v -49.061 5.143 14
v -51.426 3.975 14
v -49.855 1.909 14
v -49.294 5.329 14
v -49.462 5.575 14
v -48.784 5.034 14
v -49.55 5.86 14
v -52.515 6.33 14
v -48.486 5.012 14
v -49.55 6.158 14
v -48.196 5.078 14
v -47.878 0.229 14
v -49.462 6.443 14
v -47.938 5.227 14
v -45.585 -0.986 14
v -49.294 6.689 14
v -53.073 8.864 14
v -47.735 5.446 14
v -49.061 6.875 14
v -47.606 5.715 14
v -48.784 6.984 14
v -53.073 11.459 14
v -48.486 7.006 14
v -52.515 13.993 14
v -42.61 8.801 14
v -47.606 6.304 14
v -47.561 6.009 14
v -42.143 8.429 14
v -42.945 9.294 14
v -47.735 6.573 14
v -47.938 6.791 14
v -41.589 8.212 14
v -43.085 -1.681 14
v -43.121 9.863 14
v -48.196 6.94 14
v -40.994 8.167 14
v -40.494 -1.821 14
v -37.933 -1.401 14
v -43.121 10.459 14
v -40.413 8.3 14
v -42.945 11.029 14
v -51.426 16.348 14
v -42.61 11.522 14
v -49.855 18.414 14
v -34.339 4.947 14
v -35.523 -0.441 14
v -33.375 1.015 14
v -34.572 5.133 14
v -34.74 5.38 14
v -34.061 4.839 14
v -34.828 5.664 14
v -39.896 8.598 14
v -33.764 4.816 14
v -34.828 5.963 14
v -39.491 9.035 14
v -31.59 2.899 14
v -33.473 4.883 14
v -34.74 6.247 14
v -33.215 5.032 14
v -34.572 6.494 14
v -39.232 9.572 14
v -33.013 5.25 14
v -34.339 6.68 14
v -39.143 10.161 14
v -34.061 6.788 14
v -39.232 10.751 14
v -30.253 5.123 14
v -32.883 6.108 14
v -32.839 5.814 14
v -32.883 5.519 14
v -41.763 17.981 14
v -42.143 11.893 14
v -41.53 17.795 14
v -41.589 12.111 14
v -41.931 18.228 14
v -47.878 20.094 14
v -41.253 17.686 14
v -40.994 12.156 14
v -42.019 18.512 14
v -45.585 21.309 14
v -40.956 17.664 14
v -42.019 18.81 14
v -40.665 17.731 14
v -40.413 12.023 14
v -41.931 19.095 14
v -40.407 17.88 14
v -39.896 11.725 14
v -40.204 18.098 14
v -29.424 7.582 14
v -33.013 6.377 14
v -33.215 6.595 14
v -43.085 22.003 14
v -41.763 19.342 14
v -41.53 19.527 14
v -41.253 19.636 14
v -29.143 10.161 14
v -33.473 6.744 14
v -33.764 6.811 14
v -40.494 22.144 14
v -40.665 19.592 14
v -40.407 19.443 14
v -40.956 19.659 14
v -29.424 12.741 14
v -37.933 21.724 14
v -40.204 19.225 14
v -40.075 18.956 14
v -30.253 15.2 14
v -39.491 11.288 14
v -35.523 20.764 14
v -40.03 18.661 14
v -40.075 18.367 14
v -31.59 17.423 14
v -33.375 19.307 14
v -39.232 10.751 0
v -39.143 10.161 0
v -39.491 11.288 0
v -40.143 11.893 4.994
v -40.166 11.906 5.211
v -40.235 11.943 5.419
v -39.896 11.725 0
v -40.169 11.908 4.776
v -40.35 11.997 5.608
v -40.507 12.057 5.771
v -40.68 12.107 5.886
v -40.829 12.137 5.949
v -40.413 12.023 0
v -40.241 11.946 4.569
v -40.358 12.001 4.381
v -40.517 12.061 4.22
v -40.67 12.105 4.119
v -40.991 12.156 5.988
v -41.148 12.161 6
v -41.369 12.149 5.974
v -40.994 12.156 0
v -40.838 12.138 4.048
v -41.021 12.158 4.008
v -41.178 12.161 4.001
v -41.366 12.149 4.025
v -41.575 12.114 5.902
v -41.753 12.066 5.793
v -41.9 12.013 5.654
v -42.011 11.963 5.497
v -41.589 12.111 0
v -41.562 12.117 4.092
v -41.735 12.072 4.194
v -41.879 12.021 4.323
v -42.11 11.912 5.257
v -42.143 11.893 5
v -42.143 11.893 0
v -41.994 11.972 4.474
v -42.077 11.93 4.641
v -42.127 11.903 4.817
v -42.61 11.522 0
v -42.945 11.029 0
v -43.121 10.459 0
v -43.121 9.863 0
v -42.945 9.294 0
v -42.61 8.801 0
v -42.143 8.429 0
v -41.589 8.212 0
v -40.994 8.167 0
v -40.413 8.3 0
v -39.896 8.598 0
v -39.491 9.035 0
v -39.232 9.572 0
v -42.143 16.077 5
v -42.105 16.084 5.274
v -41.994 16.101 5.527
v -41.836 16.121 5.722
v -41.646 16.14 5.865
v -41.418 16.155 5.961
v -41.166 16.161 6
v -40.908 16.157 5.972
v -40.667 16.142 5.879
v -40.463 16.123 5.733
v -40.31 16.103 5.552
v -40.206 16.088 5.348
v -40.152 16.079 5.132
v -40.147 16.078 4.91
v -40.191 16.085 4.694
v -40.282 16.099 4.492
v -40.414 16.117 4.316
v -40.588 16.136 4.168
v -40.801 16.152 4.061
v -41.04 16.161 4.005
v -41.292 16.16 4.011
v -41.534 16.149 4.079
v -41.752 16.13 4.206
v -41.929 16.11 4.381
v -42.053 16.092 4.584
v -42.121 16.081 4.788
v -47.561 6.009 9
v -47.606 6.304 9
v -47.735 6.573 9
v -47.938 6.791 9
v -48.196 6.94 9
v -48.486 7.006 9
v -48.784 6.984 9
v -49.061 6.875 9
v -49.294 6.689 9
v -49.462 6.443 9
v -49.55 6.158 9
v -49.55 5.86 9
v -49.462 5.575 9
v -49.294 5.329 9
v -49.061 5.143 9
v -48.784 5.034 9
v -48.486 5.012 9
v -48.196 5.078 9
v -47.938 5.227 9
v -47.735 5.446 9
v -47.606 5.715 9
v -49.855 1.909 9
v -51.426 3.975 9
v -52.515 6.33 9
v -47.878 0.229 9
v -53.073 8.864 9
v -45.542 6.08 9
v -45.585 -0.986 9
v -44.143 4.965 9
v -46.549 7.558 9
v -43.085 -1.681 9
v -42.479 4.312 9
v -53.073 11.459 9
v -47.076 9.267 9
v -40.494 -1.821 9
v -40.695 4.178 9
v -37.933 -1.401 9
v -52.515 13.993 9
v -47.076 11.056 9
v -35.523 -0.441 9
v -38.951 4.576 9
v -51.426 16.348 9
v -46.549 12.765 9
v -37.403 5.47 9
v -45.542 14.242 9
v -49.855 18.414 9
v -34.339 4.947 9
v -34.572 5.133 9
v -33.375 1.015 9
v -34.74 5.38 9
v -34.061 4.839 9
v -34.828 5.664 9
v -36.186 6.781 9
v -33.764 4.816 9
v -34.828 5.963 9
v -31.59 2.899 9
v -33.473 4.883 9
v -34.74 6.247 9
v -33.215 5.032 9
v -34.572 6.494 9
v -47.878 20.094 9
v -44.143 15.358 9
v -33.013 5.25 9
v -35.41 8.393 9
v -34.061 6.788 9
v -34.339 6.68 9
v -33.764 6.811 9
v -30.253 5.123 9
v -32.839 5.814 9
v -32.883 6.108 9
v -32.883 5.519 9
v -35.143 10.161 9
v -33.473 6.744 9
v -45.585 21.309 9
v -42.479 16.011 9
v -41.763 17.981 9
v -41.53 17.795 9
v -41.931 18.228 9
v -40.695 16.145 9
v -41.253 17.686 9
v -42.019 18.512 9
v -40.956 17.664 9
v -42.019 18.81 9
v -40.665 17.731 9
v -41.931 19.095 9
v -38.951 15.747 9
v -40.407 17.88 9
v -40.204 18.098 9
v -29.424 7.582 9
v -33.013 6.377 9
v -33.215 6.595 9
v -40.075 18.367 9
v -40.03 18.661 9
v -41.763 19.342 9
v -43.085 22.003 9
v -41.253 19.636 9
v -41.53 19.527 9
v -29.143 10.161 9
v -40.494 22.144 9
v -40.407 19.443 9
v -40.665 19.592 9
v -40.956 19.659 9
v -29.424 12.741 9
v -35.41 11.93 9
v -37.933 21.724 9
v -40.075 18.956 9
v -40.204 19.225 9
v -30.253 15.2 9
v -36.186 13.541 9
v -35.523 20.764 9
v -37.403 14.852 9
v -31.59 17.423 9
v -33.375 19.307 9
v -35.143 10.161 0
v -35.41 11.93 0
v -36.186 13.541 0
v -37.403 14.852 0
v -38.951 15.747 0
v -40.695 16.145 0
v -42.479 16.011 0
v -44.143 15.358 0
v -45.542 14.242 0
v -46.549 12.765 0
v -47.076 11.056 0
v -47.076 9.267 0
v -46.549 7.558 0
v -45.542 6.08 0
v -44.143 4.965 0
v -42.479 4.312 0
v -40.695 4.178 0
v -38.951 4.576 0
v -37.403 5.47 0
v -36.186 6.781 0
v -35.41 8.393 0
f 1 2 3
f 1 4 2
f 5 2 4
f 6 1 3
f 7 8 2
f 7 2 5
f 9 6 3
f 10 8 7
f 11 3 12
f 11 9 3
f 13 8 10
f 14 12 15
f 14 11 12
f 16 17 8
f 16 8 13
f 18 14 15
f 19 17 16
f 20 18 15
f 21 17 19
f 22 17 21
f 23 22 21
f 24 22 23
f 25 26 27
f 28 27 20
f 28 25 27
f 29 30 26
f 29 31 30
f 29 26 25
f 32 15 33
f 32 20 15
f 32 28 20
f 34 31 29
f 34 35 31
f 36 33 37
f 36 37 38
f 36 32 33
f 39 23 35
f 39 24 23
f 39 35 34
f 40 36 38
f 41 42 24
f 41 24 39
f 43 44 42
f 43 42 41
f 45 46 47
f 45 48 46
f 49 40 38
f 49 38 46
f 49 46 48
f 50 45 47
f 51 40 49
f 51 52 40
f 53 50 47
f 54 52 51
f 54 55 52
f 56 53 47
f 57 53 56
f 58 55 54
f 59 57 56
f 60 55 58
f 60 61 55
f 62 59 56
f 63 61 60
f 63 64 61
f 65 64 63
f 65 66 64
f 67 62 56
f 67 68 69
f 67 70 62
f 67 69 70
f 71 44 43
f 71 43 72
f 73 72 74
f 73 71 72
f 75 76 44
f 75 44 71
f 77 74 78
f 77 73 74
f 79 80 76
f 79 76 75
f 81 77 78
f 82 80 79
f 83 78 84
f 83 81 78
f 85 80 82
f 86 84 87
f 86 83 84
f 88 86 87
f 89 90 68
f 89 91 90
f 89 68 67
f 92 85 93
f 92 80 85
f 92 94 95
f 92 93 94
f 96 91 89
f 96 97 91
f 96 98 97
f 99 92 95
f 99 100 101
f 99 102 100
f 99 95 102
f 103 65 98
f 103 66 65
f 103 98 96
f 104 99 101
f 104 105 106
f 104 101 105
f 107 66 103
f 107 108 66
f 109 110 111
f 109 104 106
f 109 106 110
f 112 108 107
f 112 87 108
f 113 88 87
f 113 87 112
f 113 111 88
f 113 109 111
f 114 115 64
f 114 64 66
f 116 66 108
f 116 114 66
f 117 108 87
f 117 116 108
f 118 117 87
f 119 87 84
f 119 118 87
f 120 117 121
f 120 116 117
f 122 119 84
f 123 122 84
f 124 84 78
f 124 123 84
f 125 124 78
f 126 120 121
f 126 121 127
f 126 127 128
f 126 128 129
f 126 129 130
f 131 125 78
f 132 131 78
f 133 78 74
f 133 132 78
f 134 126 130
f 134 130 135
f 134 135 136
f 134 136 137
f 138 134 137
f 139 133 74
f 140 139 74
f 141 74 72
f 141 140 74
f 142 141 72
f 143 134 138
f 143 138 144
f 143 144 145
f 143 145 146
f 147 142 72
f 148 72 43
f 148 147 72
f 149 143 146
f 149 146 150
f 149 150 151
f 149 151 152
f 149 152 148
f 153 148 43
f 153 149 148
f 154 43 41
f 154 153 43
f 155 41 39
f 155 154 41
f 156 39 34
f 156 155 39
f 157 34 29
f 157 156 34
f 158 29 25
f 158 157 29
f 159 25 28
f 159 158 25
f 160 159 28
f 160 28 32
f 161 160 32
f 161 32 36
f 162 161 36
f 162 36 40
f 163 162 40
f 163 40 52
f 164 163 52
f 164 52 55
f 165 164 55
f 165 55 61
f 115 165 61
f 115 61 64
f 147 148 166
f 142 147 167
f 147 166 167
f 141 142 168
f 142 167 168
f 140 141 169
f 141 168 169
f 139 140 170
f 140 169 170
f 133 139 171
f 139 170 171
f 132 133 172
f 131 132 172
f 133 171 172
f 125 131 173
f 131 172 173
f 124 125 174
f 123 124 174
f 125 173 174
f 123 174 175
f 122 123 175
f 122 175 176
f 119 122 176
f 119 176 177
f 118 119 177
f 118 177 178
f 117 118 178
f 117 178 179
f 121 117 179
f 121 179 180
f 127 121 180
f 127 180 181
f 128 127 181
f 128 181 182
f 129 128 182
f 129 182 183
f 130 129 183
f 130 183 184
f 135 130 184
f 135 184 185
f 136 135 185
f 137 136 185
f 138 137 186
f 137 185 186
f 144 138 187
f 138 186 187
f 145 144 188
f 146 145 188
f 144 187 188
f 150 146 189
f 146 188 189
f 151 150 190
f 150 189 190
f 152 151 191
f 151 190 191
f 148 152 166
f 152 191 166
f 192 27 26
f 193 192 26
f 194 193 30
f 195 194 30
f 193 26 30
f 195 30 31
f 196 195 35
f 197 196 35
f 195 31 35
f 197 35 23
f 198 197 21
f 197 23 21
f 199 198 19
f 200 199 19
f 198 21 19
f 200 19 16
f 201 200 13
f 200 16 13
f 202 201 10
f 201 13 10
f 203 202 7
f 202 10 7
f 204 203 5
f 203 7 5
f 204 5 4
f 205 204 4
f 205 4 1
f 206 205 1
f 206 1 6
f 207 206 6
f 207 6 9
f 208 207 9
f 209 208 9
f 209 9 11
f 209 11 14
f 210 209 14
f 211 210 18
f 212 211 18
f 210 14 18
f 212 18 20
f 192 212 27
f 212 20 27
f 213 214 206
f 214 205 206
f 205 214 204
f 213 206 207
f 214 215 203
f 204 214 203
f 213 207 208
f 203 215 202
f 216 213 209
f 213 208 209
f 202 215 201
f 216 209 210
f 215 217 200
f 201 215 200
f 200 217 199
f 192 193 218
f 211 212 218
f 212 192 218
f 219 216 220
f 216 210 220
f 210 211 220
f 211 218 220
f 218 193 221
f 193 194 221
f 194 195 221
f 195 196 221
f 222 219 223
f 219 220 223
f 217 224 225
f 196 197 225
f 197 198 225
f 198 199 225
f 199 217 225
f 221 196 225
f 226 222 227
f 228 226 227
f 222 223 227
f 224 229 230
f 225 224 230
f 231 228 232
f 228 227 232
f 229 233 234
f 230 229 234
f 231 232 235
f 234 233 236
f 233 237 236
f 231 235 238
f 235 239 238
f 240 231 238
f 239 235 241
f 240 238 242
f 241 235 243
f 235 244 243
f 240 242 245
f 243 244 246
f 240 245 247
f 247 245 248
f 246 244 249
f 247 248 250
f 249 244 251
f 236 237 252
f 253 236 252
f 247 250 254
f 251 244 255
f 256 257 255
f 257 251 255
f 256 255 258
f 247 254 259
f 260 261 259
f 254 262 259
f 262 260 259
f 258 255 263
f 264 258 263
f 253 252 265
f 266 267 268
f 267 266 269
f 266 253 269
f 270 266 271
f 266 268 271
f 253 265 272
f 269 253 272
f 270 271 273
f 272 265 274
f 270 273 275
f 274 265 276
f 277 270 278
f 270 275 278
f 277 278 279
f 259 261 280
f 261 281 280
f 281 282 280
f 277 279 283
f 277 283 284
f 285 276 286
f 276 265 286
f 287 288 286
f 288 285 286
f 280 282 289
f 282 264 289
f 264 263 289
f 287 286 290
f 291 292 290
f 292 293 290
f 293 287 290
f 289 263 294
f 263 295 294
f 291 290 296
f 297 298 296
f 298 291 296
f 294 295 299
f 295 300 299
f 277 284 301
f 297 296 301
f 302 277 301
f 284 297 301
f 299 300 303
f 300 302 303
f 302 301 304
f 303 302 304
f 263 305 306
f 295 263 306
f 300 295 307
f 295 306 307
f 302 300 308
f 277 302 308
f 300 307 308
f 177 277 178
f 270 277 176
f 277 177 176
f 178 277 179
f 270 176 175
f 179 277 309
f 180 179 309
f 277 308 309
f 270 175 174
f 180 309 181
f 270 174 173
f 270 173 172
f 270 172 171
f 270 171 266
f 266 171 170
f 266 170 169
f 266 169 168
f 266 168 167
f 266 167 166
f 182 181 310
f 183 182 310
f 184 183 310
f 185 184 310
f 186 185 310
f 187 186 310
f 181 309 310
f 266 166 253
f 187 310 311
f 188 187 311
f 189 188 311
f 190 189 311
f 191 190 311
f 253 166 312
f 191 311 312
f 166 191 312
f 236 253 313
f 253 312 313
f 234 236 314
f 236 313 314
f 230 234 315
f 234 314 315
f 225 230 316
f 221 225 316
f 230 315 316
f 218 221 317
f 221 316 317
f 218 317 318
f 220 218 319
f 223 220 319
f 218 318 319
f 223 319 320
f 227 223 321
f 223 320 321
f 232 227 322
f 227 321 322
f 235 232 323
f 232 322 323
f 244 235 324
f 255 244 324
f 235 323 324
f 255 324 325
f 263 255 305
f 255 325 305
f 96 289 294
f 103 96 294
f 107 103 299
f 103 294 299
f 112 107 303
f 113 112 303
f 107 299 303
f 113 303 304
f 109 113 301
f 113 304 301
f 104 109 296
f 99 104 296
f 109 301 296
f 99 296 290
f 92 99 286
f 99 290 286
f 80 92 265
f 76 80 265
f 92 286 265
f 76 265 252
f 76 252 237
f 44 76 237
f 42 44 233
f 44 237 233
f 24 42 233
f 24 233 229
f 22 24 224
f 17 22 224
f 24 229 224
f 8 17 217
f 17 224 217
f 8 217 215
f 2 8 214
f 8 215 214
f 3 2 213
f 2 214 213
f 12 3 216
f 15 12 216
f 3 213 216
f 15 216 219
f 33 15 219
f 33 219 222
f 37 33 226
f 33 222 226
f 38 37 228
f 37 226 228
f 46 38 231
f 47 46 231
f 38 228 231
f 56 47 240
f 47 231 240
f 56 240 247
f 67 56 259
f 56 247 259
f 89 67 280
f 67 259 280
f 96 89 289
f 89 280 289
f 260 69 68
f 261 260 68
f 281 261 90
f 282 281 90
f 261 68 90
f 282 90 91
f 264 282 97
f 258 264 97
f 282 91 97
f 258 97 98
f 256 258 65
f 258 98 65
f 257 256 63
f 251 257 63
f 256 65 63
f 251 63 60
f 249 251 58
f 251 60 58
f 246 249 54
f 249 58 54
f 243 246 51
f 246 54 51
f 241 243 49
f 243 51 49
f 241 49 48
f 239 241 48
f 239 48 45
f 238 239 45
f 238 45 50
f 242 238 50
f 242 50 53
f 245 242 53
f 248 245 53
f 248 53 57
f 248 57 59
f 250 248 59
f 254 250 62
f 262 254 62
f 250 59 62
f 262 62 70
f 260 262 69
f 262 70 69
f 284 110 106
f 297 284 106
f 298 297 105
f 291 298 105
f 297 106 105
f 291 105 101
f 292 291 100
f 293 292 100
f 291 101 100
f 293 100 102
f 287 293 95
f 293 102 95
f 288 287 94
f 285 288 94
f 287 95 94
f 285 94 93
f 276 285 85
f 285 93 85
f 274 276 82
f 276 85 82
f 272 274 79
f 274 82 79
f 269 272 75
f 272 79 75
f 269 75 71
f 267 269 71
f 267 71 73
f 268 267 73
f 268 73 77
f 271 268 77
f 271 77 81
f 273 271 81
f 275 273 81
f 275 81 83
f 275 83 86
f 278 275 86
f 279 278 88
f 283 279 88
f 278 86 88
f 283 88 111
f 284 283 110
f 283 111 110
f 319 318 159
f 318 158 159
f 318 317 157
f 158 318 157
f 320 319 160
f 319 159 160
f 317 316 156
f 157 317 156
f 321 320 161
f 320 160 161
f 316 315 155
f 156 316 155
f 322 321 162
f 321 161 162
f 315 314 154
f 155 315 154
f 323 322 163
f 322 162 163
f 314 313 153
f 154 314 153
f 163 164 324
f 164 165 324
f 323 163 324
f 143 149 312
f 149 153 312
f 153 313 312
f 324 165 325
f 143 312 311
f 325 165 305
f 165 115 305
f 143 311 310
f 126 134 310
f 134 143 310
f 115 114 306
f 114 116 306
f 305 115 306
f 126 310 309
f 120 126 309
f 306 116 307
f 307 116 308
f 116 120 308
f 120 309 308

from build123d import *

# Parameters (mm, degrees)
SKETCH1_R           = 6
SKETCH1_R_2         = 2
BOSS_EXTRUDE1_DEPTH = 9
SKETCH2_R           = 12
SKETCH2_R_2         = 2
BOSS_EXTRUDE2_DEPTH = 5
SKETCH3_R           = 1
CUT_EXTRUDE1_DEPTH  = 7
SKETCH4_R           = 1
CUT_EXTRUDE2_DEPTH  = 5


with BuildPart() as part:
    # Sketch1 → Boss-Extrude1 (new body)
    with BuildSketch(Plane.XY):
        with Locations((-41.143471688, 10.161406423)):
            Circle(SKETCH1_R)
        with Locations((-41.143471688, 10.161406423)):
            Circle(SKETCH1_R_2, mode=Mode.SUBTRACT)
    extrude(amount=BOSS_EXTRUDE1_DEPTH)

    # Sketch2 → Boss-Extrude2 (add)
    with BuildSketch(Plane.XY.offset(9)):
        with Locations((-41.143471688, 10.161406423)):
            Circle(SKETCH2_R)
        with Locations((-41.143471688, 10.161406423)):
            Circle(SKETCH2_R_2, mode=Mode.SUBTRACT)
    extrude(amount=BOSS_EXTRUDE2_DEPTH)

    # Sketch3 → Cut-Extrude1 (cut)
    with BuildSketch(Plane(origin=(0, 17.811406423, 0), x_dir=(1, 0, 0), z_dir=(0, 1, 0))):
        with Locations(Location((-41.143471688, -5, 0), (0, 0, 180))):
            Circle(SKETCH3_R)
    extrude(amount=-CUT_EXTRUDE1_DEPTH, mode=Mode.SUBTRACT)

    # Sketch4 → Cut-Extrude2 (cut)
    with BuildSketch(Plane.XY.offset(14)):
        with Locations((-41.030441909, 18.661406423)):
            Circle(SKETCH4_R)
        with Locations((-33.838770645, 5.813519763)):
            Circle(SKETCH4_R)
        with Locations((-48.561202509, 6.009293083)):
            Circle(SKETCH4_R)
    extrude(amount=-CUT_EXTRUDE2_DEPTH, mode=Mode.SUBTRACT)


solid = part.part
